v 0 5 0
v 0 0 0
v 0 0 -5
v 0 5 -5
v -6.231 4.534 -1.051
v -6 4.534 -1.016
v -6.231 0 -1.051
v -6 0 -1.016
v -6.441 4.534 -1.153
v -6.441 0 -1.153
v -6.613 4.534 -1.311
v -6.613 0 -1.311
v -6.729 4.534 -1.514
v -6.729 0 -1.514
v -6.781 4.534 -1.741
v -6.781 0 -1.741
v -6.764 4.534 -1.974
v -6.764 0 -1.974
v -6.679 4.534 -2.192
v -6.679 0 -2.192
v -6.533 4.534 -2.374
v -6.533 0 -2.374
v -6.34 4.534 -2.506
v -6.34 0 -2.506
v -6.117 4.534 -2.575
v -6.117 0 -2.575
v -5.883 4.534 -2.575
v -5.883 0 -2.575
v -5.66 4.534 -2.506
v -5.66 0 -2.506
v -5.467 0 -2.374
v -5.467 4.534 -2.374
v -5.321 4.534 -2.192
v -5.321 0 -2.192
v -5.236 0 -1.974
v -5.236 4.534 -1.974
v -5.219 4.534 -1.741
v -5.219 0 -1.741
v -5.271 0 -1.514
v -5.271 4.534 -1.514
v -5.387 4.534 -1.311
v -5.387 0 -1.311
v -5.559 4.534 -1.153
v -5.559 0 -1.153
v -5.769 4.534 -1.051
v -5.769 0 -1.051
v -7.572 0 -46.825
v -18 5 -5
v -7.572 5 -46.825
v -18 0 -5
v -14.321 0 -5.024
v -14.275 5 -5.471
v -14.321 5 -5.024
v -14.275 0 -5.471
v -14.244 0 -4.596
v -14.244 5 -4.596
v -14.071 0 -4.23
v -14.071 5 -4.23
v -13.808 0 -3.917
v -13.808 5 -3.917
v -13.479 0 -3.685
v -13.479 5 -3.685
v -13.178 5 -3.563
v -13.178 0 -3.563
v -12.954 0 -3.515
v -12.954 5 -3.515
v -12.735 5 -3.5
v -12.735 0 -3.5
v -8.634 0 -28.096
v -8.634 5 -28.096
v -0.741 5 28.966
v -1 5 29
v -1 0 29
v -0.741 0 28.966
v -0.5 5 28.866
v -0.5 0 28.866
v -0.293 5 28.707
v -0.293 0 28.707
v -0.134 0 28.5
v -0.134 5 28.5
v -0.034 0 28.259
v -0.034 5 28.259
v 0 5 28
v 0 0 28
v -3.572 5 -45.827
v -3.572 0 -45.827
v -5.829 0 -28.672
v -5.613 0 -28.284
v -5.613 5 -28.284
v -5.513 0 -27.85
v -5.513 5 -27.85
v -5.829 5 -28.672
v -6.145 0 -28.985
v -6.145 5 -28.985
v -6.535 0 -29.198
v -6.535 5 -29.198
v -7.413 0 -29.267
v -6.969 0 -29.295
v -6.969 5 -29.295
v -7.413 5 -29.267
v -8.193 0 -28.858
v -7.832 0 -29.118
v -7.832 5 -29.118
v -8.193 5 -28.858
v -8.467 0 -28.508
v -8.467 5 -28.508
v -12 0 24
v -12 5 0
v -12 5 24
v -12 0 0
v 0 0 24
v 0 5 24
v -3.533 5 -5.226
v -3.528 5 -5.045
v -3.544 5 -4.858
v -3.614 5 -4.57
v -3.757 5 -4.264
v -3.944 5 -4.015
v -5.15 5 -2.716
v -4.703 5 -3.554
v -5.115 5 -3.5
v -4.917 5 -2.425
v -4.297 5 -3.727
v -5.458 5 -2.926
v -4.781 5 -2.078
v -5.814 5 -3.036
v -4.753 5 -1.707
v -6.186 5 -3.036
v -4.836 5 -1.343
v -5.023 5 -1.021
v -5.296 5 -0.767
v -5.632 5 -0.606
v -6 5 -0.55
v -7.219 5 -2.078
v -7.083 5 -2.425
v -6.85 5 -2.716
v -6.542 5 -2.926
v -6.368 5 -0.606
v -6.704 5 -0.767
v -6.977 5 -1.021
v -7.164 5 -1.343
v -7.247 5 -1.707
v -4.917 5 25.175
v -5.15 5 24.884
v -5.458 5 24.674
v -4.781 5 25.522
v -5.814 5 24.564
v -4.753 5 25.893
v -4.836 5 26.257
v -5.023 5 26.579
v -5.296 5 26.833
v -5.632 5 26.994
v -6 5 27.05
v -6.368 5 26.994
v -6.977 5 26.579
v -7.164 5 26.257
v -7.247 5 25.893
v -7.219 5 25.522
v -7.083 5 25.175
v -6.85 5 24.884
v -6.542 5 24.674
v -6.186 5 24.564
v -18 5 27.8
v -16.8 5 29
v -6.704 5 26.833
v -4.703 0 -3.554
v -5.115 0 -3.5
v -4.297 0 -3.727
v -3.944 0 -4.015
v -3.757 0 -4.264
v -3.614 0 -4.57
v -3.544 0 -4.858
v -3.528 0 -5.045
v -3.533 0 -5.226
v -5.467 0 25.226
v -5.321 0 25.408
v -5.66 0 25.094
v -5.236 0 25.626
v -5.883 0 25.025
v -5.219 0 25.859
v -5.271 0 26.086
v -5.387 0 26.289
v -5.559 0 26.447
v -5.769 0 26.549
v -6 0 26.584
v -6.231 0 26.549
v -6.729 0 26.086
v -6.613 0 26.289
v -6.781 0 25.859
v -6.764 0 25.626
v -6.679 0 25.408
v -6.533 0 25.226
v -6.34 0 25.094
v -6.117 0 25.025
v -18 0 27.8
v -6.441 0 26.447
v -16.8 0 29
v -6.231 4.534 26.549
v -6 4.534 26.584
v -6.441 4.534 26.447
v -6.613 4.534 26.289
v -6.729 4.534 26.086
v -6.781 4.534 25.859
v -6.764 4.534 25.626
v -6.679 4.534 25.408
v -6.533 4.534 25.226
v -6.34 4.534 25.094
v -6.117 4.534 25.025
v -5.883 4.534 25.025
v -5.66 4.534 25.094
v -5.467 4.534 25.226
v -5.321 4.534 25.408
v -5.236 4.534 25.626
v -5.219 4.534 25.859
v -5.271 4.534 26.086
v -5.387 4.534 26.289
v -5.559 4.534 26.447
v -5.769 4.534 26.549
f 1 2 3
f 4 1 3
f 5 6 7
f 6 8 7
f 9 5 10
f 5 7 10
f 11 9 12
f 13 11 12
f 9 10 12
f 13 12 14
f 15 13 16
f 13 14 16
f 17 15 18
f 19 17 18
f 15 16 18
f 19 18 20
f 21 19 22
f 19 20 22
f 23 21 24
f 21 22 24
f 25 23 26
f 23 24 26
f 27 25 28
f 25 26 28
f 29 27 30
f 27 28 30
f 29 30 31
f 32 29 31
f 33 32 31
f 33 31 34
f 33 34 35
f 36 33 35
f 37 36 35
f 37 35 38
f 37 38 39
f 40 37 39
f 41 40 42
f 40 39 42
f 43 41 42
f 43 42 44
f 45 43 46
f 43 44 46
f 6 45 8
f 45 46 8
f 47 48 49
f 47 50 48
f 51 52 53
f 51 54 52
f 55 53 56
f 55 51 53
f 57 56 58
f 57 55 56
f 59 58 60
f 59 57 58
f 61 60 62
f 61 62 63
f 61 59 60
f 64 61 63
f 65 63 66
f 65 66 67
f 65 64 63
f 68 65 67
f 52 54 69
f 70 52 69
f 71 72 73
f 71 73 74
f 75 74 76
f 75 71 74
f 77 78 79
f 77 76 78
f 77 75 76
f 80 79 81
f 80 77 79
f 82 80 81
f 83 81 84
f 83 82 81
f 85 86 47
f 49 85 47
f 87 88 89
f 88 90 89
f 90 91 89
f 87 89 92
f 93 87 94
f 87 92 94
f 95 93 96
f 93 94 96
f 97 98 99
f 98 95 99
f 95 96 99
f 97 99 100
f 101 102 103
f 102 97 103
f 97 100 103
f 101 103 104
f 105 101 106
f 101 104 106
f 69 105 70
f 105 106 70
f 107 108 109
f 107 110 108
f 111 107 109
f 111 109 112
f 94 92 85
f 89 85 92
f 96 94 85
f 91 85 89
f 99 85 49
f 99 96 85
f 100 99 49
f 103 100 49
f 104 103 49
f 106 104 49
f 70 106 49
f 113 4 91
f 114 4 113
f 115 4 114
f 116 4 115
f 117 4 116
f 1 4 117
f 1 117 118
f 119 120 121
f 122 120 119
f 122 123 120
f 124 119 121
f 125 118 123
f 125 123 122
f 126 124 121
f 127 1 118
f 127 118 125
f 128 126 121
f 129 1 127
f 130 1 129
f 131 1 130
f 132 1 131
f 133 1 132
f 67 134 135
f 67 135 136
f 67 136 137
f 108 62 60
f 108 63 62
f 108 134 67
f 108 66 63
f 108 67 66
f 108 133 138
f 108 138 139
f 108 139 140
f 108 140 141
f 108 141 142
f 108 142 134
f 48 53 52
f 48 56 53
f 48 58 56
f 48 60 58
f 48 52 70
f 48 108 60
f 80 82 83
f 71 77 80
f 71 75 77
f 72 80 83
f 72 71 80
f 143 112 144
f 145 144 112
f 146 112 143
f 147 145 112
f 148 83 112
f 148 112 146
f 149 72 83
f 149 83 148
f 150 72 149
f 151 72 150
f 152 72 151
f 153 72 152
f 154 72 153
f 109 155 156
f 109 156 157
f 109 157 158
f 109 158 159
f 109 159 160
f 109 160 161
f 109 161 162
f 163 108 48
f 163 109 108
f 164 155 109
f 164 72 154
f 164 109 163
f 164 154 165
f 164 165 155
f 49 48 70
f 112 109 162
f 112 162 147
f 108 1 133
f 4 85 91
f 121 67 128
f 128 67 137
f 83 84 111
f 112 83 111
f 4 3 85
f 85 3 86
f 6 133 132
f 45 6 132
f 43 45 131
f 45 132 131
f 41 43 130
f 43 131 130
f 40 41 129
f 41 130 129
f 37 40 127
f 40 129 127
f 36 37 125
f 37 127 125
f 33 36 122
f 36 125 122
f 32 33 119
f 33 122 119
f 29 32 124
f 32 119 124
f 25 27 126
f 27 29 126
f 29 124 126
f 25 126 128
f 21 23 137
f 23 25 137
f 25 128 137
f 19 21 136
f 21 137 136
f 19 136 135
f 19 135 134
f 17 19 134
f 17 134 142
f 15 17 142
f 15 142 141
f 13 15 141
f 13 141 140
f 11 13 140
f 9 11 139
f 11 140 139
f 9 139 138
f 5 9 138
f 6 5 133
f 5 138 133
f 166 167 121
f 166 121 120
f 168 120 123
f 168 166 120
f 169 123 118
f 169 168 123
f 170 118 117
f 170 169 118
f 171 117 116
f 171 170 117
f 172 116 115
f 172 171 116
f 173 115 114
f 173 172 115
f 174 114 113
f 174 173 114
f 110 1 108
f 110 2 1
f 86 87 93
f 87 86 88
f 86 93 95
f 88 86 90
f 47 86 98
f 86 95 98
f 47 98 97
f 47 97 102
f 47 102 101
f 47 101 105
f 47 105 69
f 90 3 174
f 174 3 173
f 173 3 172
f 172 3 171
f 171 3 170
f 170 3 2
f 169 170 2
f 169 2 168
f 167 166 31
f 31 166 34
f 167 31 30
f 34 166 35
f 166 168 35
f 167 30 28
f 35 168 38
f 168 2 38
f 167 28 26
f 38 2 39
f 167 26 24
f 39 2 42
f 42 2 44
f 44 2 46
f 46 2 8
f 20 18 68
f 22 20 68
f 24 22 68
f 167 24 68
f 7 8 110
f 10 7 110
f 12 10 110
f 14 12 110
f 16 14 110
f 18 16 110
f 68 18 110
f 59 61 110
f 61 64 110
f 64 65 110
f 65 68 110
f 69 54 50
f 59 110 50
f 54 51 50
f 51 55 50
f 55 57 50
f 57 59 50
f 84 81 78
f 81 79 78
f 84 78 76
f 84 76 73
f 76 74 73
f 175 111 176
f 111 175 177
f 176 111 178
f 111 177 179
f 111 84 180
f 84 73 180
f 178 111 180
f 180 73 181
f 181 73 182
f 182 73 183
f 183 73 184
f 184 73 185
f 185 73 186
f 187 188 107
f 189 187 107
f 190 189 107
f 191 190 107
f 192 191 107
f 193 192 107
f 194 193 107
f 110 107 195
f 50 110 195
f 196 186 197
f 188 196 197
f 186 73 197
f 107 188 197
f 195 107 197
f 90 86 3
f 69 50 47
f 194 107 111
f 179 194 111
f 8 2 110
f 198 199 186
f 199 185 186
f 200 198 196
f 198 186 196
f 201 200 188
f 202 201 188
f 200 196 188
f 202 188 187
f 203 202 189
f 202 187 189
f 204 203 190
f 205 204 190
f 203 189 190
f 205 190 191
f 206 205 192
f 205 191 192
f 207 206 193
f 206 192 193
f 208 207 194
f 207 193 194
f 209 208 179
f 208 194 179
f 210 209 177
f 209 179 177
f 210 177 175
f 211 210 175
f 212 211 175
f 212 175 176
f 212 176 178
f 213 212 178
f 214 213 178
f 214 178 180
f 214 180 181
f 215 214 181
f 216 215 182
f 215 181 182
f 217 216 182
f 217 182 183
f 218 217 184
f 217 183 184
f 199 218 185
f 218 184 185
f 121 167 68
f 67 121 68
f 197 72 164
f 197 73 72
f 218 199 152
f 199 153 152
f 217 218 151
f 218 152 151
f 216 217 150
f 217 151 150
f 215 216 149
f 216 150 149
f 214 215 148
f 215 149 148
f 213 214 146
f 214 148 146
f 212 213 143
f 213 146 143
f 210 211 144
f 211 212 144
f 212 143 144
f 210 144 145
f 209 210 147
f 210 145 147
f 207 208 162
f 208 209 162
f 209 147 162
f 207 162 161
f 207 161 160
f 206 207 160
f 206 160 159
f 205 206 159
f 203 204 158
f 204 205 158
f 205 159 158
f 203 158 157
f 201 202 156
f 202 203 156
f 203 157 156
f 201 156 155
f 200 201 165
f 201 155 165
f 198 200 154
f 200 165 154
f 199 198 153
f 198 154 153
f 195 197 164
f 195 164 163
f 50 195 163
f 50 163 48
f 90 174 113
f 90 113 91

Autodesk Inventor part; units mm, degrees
ref_plane "YZ Plane" through (0, 0, 0) normal (1, 0, 0) x (0, 1, 0)
ref_plane "XZ Plane" through (0, 0, 0) normal (0, 1, 0) x (-1, 0, 0)
ref_plane "XY Plane" through (0, 0, 0) normal (0, 0, 1) x (1, 0, 0)
sketch "Sketch1" plane through (0, 0, 0) normal (0, 1, 0) x (-1, 0, 0)
  line L0 (0, 0) -> (18, 0)
  line L1 (0, 0) -> (0, -5)
  line L2 (0, -5) -> (3.5719, -45.8274)
  line L3 (18, 0) -> (18, -5)
  line L4 (18, -5) -> (7.5719, -46.8247)
  line L5 (3.5719, -45.8274) -> (7.5719, -46.8247)
  dimension "d0" = 18
  dimension "d1" = 5
  dimension "d3" = 175
  dimension "d6" = 76
  dimension "d7" = 4
extrude "Extrusion1" add sketch "Sketch1" along normal blind 5
shell "Shell1" thickness 3.5 removed faces 2 at (-7.1906, 5, -18.6091) at (-7.1906, 0, -18.6091)
fillet "Fillet1" radius 1.5875 5 edges at (-3.5, 2.5, -4.8472) (-6.3393, 2.5, -37.3009) (-3.5, 2.5, -3.5) (-14.5, 2.5, -3.5) (-14.5, 2.5, -4.5703)
sketch "Sketch2" plane through (0, 0, 0) normal (0, -1, 0) x (1, 0, 0)
  line L0 (0, 0) -> (-12, 0)
  line L1 (-12, 0) -> (-12, 24)
  line L2 (-12, 24) -> (0, 24)
  line L3 (0, 24) -> (0, 0)
  line L4 (0, 24) -> (-12, 24)
  line L5 (-12, 24) -> (-12, 29)
  line L6 (-12, 29) -> (0, 29)
  line L7 (0, 29) -> (0, 24)
  line L8 (-12, 0) -> (-18, 0)
  line L9 (-18, 0) -> (-18, 24)
  line L10 (-18, 24) -> (-12, 24)
  line L11 (-12, 24) -> (-12, 0)
  line L12 (-18, 24) -> (-13.7574, 24) construction
  line L13 (-12, 29) -> (-16.8, 29)
  line L14 (-16.8, 29) -> (-18, 27.8)
  line L15 (-18, 27.8) -> (-18, 24)
  dimension "d14" = 24
  dimension "d15" = 5
  dimension "d16" = 12
  dimension "d18" = 6
  dimension "d57" = 1.2
  dimension "d58" = 135
extrude "Extrusion2" add sketch "Sketch2" against normal blind 5 contours L8 L9 L10 L1 | L2 L5 L6 L7 | L10 L15 L14 L13 L5
fillet "Fillet3" radius 1 1 edges at (0, 2.5, 29)
sketch "Sketch4" plane through (0, 5, 0) normal (0, 1, 0) x (1, 0, 0)
  line L0 (-12, -24) -> (-12, 0) projected
  line L1 (-12, -12) -> (-18, -12)
  line L2 (-18, 5) -> (-18, -29) projected
  line L3 (0, -24) -> (-12, -24) projected
  line L4 (-12, 0) -> (0, 0) projected
  circle A0 centre (-6, -25.8) radius 0.8
  circle A1 centre (-6, 1.8) radius 0.8
  line L5 (0, -28) -> (0, -24) projected
  point P0 (-18, 1.9304)
  point P1 (-18, -27.8)
  point P2 (-16.8, -29)
  dimension "d31" = 1.6
  dimension "d32" = 27.6
  dimension "d43" = 6
  dimension "d46" = 13.8
hole "Hole1" at (-6, 5, 25.8) at (-6, 5, -1.8) direction (0, -1, 0) diameter 1.567 depth 10 countersink diameter 2.5 countersink angle 90 thread size "M2x0.4" class "6H" standard "ISO Metric profile"
sketch "Sketch17" plane through (0, 5, 0) normal (0, 1, 0) x (1, 0, 0)
  line L0 (-15.0964, 25.5) -> (0.714, 25.5)
  line L1 (-12, 0) -> (0, 0) projected
  line L2 (-5.1146, 3.5) -> (-12.7349, 3.5) projected
  line L3 (0.714, 25.5) -> (-0.9097, 44.0597)
  line L4 (-15.0964, 25.5) -> (-10.3033, 44.7241)
  line L5 (0, 5) -> (-3.5719, 45.8274) projected
  line L6 (-7.5719, 46.8247) -> (-18, 5) projected
  line L7 (-4.6811, 48.4754) -> (-4.2422, 48.3659)
  line L8 (-3.5719, 45.8274) -> (-7.5719, 46.8247) projected
  arc A0 (-0.9097, 44.0597) -> (-4.6811, 48.4754) centre (-5.8907, 43.6239) ccw
  arc A1 (-4.2422, 48.3659) -> (-10.3033, 44.7241) centre (-5.4518, 43.5145) ccw
  point P0 (-8.9248, 3.5)
  point P1 (-4.4629, 48.4157)
  dimension "d152" = 22
  dimension "d153" = 2.498
  dimension "d154" = 2.142
  dimension "d155" = 2.301
  dimension "d156" = 5
extrude "Extrusion13" [suppressed]
sketch "Sketch18" plane through (-15.4653, 7.5, -25.5) normal (0, 0, 1) x (1, 0, 0)
  line L0 (16.1813, -10) -> (16.1813, 0) construction
  line L1 (4.8628, 0) -> (0, 0) construction
  line L2 (16.1813, -10) -> (0, 0) construction
  line L3 (0, -10) -> (0, 0) construction
  line L4 (16.1813, 0) -> (0, -10) construction
  line L5 (23.0907, 2.5) -> (-6.9093, 2.5)
  line L6 (-6.9093, 2.5) -> (-6.9093, -12.5)
  line L7 (-6.9093, -12.5) -> (23.0907, -12.5)
  line L8 (23.0907, -12.5) -> (23.0907, 2.5)
  line L9 (23.0907, 2.5) -> (-6.9093, -12.5) construction
  line L10 (-6.9093, 2.5) -> (23.0907, -12.5) construction
  point P0 (15.4653, -7.5)
  point P1 (8.0907, -5)
  dimension "d161" = 25
  dimension "d162" = 15
extrude "Extrusion14" [suppressed]
combine "Combine8" [suppressed]
extrude "Extrusion15" [suppressed]
combine "Combine9" [suppressed]
combine "Combine10" [suppressed]
sketch "Sketch20" plane through (-15.4653, 7.5, -21.5) normal (0, 0, 1) x (1, 0, 0)
  line L0 (10.1584, -7.5) -> (13.6718, -7.5) projected
  line L1 (6.1837, -2.5) -> (2.5765, -2.5) projected
  line L2 (11.871, -7.5) -> (3.871, -7.5)
  line L3 (3.871, -7.5) -> (3.871, -2.5)
  line L4 (3.871, -2.5) -> (11.871, -2.5)
  line L5 (11.871, -2.5) -> (11.871, -7.5)
  circle A0 centre (19.0907, -8.5) radius 1
  line L6 (23.0907, -12.5) -> (-6.9093, -12.5) construction
  circle A1 centre (-2.9093, -1.5) radius 1
  line L7 (23.0907, -12.5) -> (23.0907, 2.5) construction
  line L8 (23.0907, 2.5) -> (-6.9093, 2.5) construction
  line L9 (11.871, -7.5) -> (3.871, -7.5)
  line L10 (3.871, -7.5) -> (3.871, -10)
  line L11 (3.871, -10) -> (11.871, -10)
  line L12 (11.871, -10) -> (11.871, -7.5)
  line L13 (11.871, -2.5) -> (3.871, -2.5)
  line L14 (3.871, -2.5) -> (3.871, 0)
  line L15 (3.871, 0) -> (11.871, 0)
  line L16 (11.871, 0) -> (11.871, -2.5)
  line L17 (-6.9093, 2.5) -> (-6.9093, -12.5) projected
  point P0 (15.4653, -7.5)
  point P1 (23.0907, -5)
  point P2 (23.0907, -5)
  dimension "d167" = 9.224
  dimension "d168" = 3.5943
  dimension "d171" = 2
  dimension "d173" = 7.5
  dimension "d175" = 4.22
  dimension "d181" = 2.5
  dimension "d185" = 8
  dimension "d186" = 2.5
  dimension "d202" = 15
  dimension "d203" = 11
  dimension "d204" = 3.561
  dimension "d205" = 2
extrude "Extrusion16" [suppressed]
extrude "Extrusion17" [suppressed]
chamfer "Chamfer2" [suppressed]
chamfer "Chamfer3" [suppressed]
chamfer "Chamfer4" [suppressed]
chamfer "Chamfer5" [suppressed]
sketch "Sketch21" plane through (-15.4653, 7.5, -25.5) normal (0, 0, 1) x (1, 0, 0)
  line L0 (23.0907, 2.5) -> (-6.9093, 2.5) projected
  line L1 (-6.9093, 2.5) -> (-6.9093, -10.5) projected
  line L2 (23.0907, 2.5) -> (-6.9093, 2.5)
  line L3 (-6.9093, 2.5) -> (-6.9093, -5)
  line L4 (-6.9093, -5) -> (23.0907, -5)
  line L5 (23.0907, -5) -> (23.0907, 2.5)
  point P0 (15.4653, -7.5)
  dimension "d194" = 7.5
extrude "Extrusion18" [suppressed]
extrude "Extrusion19" [suppressed]
combine "Combine11" [suppressed]
sketch "Sketch22" plane through (-15.4653, 7.5, -25.5) normal (0, 0, 1) x (1, 0, 0)
  circle A0 centre (-2.9093, -1.5) radius 1 construction
  line L0 (-2.9093, -2.5) -> (-2.9093, -1.5) construction
  circle A1 centre (-2.9093, -1.5) radius 1
  point P0 (15.4653, -7.5)
extrude "Extrusion20" [suppressed]
chamfer "Chamfer7" [suppressed]
sketch "Sketch23" plane through (7.6254, 10, -60.5) normal (0, 0, -1) x (-1, 0, 0)
  line L0 (30, -7.5) -> (3.5, -7.5) projected
  line L1 (30, -7.5) -> (30, -11)
  line L2 (26.5, -7.5) -> (30, -11) projected
  line L3 (30, -11) -> (26.5, -7.5)
  line L4 (26.5, -7.5) -> (30, -7.5)
  line L5 (0, -4) -> (3.5, -7.5) projected
  line L6 (3.5, -7.5) -> (0, -7.5)
  line L7 (0, -7.5) -> (0, -4)
  line L8 (0, -4) -> (3.5, -7.5)
  point P0 (7.6254, -10)
extrude "Extrusion21" [suppressed]
extrude "Extrusion22" [suppressed]
combine "Combine12" [suppressed]
combine "Combine13" [suppressed]
fillet "Fillet6" [suppressed]
sketch "Sketch24" plane through (-22.3746, 10, -25.5) normal (0, 1, 0) x (1, 0, 0)
  circle A0 centre (24, 29) radius 1
  line L0 (30, 35) -> (0, 35) projected
  line L1 (30, 0) -> (30, 35) projected
  circle A1 centre (24, 11) radius 1
  circle A2 centre (6, 29) radius 1
  circle A3 centre (6, 11) radius 1
  point P0 (22.3746, -25.5)
  dimension "d216" = 2
  dimension "d217" = 4.064
  dimension "d218" = 4.147
  dimension "d221" = 18
  dimension "d224" = 20
extrude "Extrusion23" [suppressed]
extrude "Extrusion24" [suppressed]
chamfer "Chamfer8" [suppressed]
chamfer "Chamfer9" [suppressed]
properties part number "CAM3D_3D tisk"
